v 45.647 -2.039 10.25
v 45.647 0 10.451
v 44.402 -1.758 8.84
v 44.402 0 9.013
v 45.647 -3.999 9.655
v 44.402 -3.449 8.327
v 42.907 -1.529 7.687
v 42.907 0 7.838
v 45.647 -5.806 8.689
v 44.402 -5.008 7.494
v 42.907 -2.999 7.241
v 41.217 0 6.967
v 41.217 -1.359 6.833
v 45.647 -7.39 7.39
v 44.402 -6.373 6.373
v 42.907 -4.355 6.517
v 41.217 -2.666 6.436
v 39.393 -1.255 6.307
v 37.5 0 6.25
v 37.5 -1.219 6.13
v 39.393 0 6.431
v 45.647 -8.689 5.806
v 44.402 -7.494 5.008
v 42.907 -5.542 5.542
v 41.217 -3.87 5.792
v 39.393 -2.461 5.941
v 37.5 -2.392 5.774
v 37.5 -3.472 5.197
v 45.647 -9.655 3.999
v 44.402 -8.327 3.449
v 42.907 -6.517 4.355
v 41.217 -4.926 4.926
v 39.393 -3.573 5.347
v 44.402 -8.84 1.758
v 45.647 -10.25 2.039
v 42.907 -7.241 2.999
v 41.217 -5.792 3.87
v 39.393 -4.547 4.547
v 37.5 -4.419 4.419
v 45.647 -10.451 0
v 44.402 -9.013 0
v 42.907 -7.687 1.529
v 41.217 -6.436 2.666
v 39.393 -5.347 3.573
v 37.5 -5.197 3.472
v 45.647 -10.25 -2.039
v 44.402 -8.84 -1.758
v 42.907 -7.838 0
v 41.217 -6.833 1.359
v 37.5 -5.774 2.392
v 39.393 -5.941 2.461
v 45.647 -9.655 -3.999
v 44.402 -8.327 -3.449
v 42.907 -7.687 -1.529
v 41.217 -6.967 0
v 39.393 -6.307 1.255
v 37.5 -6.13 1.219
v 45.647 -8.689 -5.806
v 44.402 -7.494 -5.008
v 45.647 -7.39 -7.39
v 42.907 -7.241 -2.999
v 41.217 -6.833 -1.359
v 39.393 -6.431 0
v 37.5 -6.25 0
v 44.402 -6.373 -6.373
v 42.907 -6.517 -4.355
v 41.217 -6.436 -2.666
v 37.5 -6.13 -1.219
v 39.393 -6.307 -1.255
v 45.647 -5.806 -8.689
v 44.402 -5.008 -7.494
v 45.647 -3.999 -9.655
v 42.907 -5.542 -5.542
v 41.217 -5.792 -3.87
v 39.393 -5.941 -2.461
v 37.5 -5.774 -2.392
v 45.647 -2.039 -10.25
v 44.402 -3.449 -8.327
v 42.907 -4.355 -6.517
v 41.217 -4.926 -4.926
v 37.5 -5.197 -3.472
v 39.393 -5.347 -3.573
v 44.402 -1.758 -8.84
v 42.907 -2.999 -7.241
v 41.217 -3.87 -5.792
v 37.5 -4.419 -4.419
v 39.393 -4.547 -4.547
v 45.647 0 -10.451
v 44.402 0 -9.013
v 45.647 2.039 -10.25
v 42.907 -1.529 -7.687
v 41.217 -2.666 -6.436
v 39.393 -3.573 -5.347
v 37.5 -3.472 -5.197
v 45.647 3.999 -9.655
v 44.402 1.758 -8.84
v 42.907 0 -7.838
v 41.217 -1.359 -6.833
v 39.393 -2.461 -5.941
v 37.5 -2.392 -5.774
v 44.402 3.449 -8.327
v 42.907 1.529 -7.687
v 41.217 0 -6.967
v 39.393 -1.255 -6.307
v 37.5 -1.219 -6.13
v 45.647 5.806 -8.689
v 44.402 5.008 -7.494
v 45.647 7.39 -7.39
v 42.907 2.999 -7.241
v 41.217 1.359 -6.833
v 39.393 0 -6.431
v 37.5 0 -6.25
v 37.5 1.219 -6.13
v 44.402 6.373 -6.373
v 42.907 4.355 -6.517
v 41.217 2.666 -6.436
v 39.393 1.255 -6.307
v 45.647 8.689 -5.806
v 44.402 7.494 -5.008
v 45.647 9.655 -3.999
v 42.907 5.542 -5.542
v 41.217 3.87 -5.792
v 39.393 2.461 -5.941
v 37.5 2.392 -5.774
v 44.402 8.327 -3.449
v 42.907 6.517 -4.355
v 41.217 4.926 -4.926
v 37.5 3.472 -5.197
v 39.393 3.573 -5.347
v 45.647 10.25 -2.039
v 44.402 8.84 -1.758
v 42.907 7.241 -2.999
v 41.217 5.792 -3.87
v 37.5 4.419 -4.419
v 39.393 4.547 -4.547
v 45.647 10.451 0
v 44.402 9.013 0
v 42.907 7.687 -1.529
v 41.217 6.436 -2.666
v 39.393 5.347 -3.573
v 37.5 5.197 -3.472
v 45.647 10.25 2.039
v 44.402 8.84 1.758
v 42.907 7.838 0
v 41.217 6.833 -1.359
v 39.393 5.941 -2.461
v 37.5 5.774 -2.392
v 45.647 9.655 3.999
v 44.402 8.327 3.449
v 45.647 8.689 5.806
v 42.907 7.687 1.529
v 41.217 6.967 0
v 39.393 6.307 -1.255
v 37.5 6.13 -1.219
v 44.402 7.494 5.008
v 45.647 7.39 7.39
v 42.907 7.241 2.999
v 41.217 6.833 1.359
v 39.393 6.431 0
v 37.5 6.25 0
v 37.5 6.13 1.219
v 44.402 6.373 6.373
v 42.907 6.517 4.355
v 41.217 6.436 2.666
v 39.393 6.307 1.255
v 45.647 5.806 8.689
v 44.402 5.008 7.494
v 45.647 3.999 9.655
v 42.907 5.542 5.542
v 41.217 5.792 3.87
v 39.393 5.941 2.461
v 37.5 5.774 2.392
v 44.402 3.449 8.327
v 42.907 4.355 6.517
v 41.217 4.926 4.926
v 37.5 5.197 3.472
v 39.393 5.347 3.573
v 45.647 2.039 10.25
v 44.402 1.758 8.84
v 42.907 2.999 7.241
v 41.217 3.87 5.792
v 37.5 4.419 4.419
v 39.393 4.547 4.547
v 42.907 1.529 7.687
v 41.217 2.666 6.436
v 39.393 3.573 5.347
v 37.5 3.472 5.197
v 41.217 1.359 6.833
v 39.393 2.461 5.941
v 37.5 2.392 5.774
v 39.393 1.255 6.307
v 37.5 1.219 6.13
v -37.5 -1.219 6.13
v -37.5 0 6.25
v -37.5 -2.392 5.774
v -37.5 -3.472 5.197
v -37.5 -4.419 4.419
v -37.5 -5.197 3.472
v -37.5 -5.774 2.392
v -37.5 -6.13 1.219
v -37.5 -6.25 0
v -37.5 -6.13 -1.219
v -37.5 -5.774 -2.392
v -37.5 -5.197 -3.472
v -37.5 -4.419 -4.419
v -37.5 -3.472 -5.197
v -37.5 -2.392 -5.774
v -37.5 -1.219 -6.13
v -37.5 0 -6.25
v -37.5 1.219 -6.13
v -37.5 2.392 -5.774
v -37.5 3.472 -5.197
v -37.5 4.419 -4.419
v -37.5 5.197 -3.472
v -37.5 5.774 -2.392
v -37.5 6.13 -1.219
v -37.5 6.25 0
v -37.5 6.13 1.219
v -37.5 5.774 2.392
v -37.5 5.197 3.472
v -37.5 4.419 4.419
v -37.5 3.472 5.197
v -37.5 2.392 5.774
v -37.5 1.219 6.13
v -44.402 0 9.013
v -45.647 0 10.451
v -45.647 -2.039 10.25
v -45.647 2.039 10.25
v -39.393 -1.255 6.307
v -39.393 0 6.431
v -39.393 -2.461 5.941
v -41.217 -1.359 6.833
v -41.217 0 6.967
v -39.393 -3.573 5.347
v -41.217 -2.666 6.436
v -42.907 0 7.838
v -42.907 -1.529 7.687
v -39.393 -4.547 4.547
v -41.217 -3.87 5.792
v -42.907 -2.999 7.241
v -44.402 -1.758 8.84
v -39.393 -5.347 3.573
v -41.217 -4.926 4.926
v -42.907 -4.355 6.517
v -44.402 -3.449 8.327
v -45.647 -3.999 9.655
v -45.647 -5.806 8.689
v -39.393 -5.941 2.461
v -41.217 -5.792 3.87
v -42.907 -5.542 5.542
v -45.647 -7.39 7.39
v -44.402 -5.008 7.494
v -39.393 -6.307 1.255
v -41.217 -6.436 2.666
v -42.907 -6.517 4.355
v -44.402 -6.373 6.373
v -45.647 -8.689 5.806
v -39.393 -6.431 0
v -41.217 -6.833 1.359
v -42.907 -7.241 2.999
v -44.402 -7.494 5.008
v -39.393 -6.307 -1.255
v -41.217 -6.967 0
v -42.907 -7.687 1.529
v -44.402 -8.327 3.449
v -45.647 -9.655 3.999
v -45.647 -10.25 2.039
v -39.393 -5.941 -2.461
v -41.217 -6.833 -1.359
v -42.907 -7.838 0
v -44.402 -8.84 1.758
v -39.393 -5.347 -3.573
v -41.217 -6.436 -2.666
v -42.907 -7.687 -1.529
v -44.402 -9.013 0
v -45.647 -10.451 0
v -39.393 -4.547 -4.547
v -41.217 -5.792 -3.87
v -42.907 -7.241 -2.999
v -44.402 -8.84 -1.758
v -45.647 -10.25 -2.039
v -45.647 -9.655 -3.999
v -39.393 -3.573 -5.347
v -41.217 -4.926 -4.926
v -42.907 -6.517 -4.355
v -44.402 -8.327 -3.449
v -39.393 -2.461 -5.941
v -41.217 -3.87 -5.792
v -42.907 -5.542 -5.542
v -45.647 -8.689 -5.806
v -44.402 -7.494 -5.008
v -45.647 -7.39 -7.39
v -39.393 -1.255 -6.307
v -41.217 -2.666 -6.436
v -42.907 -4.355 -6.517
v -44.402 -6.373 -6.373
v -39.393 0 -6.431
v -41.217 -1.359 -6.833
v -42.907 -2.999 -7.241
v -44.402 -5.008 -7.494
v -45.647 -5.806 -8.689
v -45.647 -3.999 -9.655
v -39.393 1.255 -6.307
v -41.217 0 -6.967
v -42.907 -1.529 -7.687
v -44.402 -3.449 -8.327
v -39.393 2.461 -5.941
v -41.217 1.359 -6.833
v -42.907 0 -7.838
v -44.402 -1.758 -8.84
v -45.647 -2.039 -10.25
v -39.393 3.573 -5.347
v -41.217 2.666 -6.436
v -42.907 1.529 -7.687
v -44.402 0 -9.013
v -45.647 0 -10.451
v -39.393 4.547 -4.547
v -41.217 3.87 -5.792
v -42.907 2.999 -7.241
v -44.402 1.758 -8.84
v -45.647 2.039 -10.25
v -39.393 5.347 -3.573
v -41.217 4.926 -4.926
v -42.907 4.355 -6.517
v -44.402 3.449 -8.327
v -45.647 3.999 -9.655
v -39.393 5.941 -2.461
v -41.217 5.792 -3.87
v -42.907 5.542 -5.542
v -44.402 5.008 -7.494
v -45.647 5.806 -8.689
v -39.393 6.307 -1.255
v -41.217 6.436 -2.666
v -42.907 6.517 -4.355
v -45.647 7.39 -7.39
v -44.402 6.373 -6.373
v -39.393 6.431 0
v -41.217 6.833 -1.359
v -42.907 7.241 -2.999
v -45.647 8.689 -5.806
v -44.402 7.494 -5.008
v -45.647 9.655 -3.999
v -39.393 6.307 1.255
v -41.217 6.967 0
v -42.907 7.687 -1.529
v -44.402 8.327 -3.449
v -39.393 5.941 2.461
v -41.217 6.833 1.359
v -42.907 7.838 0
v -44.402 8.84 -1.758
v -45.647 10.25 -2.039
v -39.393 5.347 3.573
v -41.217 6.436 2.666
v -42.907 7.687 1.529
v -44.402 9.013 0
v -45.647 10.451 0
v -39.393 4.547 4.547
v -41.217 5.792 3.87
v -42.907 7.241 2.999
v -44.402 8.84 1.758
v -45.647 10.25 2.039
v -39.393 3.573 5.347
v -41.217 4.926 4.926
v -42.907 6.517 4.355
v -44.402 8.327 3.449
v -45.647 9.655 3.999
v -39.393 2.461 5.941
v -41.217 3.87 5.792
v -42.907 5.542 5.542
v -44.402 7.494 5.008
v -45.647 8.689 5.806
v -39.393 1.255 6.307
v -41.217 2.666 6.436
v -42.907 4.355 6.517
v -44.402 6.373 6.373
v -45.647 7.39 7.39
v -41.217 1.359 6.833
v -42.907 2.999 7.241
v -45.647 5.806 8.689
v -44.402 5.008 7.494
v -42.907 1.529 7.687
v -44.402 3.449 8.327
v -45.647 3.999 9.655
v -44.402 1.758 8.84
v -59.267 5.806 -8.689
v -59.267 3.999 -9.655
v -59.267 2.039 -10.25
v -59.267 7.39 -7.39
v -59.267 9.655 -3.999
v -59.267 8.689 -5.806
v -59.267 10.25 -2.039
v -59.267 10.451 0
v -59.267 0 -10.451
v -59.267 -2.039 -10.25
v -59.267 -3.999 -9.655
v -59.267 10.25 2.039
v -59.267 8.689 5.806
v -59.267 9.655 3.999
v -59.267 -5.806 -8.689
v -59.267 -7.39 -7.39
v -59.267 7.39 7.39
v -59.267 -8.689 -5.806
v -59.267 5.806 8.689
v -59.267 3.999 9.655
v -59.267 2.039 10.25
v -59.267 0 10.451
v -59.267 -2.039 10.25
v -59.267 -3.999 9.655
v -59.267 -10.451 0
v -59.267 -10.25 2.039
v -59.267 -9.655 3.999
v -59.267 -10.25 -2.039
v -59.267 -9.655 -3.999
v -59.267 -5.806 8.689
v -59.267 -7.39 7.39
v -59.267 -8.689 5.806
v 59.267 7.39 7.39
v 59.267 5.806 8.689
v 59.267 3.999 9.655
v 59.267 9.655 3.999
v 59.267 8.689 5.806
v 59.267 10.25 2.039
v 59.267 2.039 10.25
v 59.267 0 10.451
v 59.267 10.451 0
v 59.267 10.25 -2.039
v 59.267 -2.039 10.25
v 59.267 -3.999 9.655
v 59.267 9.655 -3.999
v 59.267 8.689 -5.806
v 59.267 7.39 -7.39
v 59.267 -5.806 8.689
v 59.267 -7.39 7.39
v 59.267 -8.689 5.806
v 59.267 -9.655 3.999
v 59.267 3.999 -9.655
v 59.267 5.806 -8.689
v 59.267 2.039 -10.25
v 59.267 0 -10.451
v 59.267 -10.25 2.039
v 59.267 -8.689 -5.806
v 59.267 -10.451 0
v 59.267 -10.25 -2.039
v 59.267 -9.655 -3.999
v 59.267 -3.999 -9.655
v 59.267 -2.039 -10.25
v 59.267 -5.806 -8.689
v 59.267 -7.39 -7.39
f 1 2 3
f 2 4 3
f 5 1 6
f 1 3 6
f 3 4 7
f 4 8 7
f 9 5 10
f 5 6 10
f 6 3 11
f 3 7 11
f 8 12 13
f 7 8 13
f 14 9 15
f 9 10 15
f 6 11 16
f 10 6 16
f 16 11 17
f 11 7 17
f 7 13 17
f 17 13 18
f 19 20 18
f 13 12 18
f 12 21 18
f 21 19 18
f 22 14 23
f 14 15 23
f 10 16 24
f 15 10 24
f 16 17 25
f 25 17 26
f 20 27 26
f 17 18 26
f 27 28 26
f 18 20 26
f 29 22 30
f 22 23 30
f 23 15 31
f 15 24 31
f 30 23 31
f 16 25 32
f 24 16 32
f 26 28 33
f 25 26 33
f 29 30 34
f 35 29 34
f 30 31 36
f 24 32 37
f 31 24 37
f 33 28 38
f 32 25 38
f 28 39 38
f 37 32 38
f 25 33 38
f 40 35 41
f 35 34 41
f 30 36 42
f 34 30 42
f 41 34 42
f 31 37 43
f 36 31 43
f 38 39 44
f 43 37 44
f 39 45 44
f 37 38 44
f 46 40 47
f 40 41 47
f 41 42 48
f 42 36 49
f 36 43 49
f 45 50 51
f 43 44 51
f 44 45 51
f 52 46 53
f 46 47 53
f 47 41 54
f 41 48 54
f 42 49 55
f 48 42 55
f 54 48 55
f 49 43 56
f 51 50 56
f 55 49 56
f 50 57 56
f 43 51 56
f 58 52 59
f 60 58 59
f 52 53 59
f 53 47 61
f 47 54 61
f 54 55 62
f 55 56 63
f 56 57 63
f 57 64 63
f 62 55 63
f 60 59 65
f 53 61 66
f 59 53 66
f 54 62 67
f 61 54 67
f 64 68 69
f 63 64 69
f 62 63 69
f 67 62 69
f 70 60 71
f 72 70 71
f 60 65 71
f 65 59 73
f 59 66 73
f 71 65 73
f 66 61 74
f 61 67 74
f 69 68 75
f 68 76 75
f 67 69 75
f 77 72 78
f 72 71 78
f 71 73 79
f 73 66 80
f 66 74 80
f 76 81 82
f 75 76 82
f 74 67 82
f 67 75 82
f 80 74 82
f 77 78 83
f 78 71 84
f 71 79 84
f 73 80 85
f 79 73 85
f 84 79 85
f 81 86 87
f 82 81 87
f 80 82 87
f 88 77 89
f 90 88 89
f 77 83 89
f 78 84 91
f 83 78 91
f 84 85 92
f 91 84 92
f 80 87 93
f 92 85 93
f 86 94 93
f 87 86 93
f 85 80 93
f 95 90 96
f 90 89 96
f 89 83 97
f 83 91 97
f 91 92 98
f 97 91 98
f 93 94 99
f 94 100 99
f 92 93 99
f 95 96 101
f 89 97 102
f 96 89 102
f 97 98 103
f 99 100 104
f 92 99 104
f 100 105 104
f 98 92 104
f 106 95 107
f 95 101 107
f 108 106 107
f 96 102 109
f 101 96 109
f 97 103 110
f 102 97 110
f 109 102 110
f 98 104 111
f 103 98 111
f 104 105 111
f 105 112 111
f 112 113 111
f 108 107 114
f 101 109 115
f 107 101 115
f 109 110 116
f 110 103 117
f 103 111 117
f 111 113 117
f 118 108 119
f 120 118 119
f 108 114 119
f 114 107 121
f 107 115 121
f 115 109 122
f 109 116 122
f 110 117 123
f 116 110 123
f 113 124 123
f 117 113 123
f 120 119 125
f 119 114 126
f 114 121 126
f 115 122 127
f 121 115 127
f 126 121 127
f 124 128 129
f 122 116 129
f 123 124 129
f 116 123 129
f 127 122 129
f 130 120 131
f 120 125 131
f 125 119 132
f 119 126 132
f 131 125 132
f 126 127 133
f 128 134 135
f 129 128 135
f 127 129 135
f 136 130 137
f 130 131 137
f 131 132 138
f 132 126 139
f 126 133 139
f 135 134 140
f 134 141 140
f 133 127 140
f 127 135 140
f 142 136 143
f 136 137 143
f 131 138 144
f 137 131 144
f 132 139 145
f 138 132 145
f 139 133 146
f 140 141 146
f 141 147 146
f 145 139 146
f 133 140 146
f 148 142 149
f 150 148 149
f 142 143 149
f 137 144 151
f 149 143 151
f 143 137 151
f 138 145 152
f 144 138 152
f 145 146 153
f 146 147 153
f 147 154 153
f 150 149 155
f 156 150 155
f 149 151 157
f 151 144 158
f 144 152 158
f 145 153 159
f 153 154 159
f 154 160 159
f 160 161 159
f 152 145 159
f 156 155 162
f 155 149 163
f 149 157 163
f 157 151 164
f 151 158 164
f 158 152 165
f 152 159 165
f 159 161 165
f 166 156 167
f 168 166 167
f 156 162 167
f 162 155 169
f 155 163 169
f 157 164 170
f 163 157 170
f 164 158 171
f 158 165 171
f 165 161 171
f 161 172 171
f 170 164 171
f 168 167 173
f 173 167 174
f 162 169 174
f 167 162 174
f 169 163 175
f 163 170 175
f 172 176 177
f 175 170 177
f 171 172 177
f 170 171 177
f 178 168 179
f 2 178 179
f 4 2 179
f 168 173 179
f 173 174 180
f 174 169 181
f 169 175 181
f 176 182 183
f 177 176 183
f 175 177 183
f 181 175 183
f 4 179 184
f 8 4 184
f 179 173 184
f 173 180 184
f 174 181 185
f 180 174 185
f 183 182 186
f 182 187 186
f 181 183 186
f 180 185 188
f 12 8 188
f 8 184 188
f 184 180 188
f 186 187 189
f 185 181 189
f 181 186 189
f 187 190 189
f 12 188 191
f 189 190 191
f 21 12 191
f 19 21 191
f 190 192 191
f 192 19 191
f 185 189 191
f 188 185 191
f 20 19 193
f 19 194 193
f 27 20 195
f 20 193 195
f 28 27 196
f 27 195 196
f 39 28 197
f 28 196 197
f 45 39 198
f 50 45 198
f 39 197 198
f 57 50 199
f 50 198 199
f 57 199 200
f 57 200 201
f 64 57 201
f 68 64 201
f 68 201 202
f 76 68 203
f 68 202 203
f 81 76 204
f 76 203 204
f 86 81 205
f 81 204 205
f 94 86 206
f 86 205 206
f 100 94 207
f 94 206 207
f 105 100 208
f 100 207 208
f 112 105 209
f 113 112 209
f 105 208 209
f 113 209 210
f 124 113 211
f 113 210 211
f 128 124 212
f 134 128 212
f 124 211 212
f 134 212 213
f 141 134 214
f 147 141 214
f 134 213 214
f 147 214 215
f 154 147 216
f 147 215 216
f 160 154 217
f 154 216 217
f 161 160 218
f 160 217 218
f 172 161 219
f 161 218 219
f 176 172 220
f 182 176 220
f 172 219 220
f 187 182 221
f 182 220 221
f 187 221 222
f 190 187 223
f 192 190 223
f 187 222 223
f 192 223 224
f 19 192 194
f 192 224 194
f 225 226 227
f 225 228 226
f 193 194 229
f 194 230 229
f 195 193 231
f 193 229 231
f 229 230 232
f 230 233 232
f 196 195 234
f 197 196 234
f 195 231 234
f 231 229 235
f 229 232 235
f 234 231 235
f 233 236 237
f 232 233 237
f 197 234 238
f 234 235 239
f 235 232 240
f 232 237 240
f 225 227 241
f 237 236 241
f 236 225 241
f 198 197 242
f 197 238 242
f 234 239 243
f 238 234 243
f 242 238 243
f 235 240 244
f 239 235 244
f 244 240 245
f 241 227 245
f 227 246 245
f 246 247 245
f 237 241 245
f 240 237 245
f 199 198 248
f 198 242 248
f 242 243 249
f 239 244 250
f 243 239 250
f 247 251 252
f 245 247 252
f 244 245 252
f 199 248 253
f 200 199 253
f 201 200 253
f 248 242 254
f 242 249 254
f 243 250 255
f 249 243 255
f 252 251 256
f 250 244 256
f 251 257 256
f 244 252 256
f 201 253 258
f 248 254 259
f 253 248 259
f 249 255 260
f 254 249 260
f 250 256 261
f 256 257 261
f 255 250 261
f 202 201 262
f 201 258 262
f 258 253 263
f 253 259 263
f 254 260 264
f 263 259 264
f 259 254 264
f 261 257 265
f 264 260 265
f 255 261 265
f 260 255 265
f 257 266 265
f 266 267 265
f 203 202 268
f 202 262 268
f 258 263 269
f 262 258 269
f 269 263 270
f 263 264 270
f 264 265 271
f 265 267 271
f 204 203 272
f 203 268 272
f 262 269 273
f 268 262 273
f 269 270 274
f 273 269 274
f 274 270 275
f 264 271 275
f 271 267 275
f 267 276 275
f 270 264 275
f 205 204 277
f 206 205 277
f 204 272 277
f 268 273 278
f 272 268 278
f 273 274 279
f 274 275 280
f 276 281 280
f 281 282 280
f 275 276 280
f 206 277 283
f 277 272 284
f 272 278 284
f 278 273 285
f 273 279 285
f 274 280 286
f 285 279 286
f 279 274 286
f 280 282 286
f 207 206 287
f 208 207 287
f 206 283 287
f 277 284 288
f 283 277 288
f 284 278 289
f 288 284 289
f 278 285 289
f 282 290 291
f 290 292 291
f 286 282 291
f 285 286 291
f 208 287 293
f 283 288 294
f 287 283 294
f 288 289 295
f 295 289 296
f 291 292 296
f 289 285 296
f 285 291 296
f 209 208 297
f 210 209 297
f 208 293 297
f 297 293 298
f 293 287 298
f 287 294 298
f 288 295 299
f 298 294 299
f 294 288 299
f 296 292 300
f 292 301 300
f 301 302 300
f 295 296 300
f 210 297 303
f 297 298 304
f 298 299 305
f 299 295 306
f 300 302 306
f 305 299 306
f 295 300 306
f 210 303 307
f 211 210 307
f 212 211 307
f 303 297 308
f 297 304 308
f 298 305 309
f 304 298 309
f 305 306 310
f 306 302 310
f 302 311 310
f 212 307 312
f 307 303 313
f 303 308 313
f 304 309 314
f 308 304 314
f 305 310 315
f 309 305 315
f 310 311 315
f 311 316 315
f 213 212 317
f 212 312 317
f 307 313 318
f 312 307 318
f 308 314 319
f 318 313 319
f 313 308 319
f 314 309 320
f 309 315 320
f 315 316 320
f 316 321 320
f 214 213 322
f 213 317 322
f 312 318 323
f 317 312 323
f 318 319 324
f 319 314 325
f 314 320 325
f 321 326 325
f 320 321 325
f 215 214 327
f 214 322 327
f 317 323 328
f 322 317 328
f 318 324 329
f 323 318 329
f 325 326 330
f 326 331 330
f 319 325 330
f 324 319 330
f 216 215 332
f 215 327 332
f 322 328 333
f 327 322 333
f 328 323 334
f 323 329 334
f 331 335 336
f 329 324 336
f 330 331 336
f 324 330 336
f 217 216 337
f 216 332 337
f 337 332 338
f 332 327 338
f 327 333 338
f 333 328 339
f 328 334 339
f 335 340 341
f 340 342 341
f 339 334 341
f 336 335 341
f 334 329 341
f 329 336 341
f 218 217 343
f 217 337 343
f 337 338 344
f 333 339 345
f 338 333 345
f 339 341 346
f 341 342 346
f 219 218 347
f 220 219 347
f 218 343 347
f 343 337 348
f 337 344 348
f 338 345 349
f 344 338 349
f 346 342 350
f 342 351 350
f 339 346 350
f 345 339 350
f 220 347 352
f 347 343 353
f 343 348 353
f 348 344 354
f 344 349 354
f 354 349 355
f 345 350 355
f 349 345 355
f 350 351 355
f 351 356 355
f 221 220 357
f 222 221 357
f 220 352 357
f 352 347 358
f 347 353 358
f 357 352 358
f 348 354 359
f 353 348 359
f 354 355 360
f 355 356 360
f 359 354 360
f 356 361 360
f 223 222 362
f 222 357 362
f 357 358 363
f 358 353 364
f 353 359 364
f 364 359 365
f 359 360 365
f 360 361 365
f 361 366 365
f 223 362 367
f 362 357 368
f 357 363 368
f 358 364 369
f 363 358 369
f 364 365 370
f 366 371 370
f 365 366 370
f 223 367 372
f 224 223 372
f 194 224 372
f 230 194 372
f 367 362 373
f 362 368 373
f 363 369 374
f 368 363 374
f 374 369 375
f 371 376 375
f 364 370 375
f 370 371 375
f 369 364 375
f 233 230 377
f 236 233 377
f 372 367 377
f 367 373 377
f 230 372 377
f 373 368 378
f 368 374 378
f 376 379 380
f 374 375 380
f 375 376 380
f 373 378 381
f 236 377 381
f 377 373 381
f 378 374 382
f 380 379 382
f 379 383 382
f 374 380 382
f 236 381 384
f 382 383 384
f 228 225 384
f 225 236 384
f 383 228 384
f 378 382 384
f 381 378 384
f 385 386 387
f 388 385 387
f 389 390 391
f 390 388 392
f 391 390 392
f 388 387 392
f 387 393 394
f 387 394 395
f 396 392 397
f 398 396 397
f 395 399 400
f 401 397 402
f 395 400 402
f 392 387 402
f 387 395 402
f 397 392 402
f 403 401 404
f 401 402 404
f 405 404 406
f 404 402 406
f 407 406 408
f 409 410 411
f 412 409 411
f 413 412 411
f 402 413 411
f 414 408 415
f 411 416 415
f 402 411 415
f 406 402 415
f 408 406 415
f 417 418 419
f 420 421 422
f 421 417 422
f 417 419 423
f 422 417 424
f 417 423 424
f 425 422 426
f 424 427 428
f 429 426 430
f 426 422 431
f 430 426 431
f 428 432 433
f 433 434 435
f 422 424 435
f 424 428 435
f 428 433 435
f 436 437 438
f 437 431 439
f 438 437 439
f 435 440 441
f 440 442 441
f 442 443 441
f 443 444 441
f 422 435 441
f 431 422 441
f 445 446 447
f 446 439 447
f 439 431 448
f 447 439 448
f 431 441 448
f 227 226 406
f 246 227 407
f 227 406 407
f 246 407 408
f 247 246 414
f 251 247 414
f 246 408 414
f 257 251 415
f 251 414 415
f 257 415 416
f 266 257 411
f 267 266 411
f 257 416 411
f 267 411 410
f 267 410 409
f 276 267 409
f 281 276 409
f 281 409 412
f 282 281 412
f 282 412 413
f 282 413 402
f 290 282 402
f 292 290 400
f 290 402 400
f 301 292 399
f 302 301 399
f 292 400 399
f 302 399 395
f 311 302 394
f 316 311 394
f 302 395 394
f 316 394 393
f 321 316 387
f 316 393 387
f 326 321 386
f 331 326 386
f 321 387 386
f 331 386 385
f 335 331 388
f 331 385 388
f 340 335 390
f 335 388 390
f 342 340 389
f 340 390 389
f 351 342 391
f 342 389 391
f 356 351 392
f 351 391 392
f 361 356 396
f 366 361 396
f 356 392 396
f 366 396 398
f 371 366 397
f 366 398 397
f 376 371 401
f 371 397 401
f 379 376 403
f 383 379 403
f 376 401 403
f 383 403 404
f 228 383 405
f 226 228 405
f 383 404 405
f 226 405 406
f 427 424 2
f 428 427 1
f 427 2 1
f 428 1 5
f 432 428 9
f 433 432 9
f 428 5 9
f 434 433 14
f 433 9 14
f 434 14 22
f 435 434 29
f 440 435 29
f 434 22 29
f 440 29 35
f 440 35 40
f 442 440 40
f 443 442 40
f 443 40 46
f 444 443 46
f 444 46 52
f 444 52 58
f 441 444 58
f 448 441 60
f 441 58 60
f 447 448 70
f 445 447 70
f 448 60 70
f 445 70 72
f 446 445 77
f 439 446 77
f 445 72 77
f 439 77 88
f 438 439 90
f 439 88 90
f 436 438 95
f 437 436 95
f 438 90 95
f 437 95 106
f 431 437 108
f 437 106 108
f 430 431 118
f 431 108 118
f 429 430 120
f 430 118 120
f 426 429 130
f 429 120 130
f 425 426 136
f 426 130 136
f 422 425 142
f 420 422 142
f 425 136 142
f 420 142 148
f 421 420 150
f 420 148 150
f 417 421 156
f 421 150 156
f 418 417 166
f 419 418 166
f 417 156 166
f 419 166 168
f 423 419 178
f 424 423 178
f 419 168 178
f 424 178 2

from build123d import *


with BuildPart() as f1:
    # F0 (on Front) → F1 (revolve)
    with BuildSketch(Plane.XZ):
        with BuildLine():
            Line((37.5, 6.25), (0, 6.25))
            Line((0, 6.25), (-37.5, 6.25))
            ThreePointArc((-37.5, 6.25), (-42.082891, 7.361968), (-45.646576, 10.450578))
            Line((-45.646576, 10.450578), (-59.267242, 10.450578))
            Line((-59.267242, 10.450578), (-59.267242, 0))
            Line((-59.267242, 0), (0, 0))
            Line((0, 0), (59.267242, 0))
            Line((59.267242, 0), (59.267242, 10.450578))
            Line((59.267242, 10.450578), (45.646576, 10.450578))
            ThreePointArc((45.646576, 10.450578), (42.082891, 7.361968), (37.5, 6.25))
        make_face()
    revolve(axis=Axis((-29.633621, 0, 0), (1, 0, 0)))


solid = f1.part
